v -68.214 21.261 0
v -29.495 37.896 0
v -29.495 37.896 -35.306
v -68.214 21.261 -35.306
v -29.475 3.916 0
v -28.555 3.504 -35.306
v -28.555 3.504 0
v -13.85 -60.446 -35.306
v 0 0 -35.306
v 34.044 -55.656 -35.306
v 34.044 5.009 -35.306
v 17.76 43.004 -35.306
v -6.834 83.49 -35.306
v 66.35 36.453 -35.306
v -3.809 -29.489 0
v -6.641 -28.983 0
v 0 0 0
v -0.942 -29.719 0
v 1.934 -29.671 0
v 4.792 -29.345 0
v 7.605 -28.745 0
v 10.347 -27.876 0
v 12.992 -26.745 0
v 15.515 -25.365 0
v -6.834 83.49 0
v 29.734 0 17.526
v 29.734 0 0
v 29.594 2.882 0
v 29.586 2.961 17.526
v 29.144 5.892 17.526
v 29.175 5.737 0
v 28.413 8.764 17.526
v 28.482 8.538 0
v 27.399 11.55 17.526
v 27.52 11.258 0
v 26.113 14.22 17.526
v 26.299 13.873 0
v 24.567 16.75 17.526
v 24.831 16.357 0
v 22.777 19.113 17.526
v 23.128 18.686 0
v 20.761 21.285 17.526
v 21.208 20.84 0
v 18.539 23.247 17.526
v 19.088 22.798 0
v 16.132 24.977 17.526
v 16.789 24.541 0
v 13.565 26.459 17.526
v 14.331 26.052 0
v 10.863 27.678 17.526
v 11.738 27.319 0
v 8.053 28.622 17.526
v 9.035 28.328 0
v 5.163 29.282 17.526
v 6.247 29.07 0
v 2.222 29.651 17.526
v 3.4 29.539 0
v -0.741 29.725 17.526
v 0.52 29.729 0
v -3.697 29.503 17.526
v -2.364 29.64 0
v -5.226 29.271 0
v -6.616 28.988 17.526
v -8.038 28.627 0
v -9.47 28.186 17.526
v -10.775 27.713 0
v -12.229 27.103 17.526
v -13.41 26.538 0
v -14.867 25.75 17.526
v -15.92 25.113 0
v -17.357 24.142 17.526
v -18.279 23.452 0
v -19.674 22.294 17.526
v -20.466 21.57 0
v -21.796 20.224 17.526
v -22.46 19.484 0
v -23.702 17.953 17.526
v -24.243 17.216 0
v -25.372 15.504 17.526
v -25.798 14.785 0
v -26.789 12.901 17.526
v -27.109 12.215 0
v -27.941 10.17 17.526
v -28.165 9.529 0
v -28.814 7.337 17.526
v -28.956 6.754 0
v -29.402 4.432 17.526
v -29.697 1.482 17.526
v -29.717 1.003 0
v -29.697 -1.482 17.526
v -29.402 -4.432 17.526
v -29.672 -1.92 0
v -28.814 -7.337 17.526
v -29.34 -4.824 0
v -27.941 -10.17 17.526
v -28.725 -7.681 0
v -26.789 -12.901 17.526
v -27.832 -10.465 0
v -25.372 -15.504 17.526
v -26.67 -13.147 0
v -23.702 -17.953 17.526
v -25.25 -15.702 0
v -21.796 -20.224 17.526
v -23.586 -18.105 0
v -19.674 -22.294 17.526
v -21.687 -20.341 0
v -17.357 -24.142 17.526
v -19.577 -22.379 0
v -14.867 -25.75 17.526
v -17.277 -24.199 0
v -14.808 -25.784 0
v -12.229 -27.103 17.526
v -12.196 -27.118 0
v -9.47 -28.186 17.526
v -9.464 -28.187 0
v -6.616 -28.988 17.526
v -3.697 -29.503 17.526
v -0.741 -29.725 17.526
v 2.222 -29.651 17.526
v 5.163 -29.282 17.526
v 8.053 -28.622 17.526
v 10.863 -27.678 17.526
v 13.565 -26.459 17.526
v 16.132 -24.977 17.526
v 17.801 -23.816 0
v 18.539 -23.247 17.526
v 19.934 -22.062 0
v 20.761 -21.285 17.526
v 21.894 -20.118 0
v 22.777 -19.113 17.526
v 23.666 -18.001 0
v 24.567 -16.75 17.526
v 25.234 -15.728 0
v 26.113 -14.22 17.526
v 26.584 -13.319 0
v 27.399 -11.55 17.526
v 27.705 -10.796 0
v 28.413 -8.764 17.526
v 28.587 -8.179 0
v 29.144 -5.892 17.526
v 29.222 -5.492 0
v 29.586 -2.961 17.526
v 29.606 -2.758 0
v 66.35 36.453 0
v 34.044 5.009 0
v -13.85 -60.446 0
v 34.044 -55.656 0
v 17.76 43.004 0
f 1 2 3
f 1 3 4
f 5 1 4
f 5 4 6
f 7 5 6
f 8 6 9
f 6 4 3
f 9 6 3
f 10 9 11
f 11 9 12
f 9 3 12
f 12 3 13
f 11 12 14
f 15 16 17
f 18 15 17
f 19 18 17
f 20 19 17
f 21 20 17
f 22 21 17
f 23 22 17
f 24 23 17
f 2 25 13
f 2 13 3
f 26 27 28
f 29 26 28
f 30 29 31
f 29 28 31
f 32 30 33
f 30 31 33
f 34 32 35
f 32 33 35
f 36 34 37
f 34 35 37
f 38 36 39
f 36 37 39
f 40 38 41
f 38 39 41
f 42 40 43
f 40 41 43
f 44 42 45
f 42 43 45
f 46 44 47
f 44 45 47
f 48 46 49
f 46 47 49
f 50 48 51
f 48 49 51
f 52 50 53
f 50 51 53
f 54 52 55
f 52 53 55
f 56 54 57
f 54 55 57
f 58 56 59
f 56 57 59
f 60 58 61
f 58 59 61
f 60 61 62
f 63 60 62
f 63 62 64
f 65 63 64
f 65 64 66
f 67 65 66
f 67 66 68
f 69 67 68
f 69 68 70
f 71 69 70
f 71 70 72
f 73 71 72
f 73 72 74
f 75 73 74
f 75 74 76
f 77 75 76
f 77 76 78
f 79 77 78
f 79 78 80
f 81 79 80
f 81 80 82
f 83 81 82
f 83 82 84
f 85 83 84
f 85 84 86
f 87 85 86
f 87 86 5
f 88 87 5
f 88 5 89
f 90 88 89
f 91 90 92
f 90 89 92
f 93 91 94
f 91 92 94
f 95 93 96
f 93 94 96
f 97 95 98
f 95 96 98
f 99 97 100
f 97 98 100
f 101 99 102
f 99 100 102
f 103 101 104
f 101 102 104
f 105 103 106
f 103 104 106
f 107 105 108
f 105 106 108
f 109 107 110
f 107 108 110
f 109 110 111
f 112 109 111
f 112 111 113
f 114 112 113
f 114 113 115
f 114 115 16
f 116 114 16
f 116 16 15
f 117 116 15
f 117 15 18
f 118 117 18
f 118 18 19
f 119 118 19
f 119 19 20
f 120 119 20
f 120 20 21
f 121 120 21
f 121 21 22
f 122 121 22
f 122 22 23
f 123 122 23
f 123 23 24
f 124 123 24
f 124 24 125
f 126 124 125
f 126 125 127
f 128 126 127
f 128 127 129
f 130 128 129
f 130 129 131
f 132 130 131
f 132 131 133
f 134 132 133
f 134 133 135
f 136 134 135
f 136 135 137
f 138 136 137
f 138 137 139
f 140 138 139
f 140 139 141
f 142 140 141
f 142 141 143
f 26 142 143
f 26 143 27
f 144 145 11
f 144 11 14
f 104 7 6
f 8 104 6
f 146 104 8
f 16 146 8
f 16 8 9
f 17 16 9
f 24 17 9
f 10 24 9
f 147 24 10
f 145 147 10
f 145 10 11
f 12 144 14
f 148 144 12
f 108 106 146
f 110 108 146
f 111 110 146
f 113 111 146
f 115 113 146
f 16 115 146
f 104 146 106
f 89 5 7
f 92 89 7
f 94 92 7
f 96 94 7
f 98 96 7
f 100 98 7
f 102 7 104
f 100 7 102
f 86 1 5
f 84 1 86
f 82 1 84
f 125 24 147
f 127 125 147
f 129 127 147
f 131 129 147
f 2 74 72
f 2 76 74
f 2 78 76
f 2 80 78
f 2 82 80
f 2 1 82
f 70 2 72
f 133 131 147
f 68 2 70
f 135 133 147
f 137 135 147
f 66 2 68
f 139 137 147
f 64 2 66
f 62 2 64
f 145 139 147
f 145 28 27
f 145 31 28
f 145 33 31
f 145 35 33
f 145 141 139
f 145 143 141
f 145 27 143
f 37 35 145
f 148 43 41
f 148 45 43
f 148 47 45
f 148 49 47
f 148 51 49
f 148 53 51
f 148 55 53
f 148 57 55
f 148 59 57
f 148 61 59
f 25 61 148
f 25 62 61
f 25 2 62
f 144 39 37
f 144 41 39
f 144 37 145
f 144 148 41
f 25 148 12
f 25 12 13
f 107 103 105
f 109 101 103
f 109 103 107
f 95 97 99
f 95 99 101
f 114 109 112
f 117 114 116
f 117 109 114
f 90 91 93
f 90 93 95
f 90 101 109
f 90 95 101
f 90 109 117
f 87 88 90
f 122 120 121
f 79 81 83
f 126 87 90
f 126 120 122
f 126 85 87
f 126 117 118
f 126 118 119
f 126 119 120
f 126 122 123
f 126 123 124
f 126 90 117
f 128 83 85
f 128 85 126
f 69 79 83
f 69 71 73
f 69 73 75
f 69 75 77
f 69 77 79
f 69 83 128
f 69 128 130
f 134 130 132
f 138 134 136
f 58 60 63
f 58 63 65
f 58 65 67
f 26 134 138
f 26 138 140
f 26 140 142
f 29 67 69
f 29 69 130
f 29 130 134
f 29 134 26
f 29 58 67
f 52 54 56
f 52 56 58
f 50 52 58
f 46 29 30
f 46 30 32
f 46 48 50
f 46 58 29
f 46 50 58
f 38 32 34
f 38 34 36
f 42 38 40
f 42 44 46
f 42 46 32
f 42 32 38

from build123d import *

# Parameters (mm, degrees)
F1_DEPTH = 35.306
F2_R     = 29.733819
F3_DEPTH = 17.526


with BuildPart() as f1:
    # F0 (on Top) → F1 (new body)
    with BuildSketch(Plane.XY):
        Polygon((-6.834473, 83.489791), (-29.494941, 37.89553), (-68.213977, 21.260617), (-28.555268, 3.504229), (-13.849725, -60.445834), (0, 0), (34.043796, -55.656485), (34.043796, 5.008644), (66.349685, 36.453225), (17.759997, 43.004174), align=None)
    extrude(amount=-F1_DEPTH)

    # F2 (on Top) → F3 (join)
    with BuildSketch(Plane.XY):
        Circle(F2_R)
    extrude(amount=F3_DEPTH)


solid = f1.part
